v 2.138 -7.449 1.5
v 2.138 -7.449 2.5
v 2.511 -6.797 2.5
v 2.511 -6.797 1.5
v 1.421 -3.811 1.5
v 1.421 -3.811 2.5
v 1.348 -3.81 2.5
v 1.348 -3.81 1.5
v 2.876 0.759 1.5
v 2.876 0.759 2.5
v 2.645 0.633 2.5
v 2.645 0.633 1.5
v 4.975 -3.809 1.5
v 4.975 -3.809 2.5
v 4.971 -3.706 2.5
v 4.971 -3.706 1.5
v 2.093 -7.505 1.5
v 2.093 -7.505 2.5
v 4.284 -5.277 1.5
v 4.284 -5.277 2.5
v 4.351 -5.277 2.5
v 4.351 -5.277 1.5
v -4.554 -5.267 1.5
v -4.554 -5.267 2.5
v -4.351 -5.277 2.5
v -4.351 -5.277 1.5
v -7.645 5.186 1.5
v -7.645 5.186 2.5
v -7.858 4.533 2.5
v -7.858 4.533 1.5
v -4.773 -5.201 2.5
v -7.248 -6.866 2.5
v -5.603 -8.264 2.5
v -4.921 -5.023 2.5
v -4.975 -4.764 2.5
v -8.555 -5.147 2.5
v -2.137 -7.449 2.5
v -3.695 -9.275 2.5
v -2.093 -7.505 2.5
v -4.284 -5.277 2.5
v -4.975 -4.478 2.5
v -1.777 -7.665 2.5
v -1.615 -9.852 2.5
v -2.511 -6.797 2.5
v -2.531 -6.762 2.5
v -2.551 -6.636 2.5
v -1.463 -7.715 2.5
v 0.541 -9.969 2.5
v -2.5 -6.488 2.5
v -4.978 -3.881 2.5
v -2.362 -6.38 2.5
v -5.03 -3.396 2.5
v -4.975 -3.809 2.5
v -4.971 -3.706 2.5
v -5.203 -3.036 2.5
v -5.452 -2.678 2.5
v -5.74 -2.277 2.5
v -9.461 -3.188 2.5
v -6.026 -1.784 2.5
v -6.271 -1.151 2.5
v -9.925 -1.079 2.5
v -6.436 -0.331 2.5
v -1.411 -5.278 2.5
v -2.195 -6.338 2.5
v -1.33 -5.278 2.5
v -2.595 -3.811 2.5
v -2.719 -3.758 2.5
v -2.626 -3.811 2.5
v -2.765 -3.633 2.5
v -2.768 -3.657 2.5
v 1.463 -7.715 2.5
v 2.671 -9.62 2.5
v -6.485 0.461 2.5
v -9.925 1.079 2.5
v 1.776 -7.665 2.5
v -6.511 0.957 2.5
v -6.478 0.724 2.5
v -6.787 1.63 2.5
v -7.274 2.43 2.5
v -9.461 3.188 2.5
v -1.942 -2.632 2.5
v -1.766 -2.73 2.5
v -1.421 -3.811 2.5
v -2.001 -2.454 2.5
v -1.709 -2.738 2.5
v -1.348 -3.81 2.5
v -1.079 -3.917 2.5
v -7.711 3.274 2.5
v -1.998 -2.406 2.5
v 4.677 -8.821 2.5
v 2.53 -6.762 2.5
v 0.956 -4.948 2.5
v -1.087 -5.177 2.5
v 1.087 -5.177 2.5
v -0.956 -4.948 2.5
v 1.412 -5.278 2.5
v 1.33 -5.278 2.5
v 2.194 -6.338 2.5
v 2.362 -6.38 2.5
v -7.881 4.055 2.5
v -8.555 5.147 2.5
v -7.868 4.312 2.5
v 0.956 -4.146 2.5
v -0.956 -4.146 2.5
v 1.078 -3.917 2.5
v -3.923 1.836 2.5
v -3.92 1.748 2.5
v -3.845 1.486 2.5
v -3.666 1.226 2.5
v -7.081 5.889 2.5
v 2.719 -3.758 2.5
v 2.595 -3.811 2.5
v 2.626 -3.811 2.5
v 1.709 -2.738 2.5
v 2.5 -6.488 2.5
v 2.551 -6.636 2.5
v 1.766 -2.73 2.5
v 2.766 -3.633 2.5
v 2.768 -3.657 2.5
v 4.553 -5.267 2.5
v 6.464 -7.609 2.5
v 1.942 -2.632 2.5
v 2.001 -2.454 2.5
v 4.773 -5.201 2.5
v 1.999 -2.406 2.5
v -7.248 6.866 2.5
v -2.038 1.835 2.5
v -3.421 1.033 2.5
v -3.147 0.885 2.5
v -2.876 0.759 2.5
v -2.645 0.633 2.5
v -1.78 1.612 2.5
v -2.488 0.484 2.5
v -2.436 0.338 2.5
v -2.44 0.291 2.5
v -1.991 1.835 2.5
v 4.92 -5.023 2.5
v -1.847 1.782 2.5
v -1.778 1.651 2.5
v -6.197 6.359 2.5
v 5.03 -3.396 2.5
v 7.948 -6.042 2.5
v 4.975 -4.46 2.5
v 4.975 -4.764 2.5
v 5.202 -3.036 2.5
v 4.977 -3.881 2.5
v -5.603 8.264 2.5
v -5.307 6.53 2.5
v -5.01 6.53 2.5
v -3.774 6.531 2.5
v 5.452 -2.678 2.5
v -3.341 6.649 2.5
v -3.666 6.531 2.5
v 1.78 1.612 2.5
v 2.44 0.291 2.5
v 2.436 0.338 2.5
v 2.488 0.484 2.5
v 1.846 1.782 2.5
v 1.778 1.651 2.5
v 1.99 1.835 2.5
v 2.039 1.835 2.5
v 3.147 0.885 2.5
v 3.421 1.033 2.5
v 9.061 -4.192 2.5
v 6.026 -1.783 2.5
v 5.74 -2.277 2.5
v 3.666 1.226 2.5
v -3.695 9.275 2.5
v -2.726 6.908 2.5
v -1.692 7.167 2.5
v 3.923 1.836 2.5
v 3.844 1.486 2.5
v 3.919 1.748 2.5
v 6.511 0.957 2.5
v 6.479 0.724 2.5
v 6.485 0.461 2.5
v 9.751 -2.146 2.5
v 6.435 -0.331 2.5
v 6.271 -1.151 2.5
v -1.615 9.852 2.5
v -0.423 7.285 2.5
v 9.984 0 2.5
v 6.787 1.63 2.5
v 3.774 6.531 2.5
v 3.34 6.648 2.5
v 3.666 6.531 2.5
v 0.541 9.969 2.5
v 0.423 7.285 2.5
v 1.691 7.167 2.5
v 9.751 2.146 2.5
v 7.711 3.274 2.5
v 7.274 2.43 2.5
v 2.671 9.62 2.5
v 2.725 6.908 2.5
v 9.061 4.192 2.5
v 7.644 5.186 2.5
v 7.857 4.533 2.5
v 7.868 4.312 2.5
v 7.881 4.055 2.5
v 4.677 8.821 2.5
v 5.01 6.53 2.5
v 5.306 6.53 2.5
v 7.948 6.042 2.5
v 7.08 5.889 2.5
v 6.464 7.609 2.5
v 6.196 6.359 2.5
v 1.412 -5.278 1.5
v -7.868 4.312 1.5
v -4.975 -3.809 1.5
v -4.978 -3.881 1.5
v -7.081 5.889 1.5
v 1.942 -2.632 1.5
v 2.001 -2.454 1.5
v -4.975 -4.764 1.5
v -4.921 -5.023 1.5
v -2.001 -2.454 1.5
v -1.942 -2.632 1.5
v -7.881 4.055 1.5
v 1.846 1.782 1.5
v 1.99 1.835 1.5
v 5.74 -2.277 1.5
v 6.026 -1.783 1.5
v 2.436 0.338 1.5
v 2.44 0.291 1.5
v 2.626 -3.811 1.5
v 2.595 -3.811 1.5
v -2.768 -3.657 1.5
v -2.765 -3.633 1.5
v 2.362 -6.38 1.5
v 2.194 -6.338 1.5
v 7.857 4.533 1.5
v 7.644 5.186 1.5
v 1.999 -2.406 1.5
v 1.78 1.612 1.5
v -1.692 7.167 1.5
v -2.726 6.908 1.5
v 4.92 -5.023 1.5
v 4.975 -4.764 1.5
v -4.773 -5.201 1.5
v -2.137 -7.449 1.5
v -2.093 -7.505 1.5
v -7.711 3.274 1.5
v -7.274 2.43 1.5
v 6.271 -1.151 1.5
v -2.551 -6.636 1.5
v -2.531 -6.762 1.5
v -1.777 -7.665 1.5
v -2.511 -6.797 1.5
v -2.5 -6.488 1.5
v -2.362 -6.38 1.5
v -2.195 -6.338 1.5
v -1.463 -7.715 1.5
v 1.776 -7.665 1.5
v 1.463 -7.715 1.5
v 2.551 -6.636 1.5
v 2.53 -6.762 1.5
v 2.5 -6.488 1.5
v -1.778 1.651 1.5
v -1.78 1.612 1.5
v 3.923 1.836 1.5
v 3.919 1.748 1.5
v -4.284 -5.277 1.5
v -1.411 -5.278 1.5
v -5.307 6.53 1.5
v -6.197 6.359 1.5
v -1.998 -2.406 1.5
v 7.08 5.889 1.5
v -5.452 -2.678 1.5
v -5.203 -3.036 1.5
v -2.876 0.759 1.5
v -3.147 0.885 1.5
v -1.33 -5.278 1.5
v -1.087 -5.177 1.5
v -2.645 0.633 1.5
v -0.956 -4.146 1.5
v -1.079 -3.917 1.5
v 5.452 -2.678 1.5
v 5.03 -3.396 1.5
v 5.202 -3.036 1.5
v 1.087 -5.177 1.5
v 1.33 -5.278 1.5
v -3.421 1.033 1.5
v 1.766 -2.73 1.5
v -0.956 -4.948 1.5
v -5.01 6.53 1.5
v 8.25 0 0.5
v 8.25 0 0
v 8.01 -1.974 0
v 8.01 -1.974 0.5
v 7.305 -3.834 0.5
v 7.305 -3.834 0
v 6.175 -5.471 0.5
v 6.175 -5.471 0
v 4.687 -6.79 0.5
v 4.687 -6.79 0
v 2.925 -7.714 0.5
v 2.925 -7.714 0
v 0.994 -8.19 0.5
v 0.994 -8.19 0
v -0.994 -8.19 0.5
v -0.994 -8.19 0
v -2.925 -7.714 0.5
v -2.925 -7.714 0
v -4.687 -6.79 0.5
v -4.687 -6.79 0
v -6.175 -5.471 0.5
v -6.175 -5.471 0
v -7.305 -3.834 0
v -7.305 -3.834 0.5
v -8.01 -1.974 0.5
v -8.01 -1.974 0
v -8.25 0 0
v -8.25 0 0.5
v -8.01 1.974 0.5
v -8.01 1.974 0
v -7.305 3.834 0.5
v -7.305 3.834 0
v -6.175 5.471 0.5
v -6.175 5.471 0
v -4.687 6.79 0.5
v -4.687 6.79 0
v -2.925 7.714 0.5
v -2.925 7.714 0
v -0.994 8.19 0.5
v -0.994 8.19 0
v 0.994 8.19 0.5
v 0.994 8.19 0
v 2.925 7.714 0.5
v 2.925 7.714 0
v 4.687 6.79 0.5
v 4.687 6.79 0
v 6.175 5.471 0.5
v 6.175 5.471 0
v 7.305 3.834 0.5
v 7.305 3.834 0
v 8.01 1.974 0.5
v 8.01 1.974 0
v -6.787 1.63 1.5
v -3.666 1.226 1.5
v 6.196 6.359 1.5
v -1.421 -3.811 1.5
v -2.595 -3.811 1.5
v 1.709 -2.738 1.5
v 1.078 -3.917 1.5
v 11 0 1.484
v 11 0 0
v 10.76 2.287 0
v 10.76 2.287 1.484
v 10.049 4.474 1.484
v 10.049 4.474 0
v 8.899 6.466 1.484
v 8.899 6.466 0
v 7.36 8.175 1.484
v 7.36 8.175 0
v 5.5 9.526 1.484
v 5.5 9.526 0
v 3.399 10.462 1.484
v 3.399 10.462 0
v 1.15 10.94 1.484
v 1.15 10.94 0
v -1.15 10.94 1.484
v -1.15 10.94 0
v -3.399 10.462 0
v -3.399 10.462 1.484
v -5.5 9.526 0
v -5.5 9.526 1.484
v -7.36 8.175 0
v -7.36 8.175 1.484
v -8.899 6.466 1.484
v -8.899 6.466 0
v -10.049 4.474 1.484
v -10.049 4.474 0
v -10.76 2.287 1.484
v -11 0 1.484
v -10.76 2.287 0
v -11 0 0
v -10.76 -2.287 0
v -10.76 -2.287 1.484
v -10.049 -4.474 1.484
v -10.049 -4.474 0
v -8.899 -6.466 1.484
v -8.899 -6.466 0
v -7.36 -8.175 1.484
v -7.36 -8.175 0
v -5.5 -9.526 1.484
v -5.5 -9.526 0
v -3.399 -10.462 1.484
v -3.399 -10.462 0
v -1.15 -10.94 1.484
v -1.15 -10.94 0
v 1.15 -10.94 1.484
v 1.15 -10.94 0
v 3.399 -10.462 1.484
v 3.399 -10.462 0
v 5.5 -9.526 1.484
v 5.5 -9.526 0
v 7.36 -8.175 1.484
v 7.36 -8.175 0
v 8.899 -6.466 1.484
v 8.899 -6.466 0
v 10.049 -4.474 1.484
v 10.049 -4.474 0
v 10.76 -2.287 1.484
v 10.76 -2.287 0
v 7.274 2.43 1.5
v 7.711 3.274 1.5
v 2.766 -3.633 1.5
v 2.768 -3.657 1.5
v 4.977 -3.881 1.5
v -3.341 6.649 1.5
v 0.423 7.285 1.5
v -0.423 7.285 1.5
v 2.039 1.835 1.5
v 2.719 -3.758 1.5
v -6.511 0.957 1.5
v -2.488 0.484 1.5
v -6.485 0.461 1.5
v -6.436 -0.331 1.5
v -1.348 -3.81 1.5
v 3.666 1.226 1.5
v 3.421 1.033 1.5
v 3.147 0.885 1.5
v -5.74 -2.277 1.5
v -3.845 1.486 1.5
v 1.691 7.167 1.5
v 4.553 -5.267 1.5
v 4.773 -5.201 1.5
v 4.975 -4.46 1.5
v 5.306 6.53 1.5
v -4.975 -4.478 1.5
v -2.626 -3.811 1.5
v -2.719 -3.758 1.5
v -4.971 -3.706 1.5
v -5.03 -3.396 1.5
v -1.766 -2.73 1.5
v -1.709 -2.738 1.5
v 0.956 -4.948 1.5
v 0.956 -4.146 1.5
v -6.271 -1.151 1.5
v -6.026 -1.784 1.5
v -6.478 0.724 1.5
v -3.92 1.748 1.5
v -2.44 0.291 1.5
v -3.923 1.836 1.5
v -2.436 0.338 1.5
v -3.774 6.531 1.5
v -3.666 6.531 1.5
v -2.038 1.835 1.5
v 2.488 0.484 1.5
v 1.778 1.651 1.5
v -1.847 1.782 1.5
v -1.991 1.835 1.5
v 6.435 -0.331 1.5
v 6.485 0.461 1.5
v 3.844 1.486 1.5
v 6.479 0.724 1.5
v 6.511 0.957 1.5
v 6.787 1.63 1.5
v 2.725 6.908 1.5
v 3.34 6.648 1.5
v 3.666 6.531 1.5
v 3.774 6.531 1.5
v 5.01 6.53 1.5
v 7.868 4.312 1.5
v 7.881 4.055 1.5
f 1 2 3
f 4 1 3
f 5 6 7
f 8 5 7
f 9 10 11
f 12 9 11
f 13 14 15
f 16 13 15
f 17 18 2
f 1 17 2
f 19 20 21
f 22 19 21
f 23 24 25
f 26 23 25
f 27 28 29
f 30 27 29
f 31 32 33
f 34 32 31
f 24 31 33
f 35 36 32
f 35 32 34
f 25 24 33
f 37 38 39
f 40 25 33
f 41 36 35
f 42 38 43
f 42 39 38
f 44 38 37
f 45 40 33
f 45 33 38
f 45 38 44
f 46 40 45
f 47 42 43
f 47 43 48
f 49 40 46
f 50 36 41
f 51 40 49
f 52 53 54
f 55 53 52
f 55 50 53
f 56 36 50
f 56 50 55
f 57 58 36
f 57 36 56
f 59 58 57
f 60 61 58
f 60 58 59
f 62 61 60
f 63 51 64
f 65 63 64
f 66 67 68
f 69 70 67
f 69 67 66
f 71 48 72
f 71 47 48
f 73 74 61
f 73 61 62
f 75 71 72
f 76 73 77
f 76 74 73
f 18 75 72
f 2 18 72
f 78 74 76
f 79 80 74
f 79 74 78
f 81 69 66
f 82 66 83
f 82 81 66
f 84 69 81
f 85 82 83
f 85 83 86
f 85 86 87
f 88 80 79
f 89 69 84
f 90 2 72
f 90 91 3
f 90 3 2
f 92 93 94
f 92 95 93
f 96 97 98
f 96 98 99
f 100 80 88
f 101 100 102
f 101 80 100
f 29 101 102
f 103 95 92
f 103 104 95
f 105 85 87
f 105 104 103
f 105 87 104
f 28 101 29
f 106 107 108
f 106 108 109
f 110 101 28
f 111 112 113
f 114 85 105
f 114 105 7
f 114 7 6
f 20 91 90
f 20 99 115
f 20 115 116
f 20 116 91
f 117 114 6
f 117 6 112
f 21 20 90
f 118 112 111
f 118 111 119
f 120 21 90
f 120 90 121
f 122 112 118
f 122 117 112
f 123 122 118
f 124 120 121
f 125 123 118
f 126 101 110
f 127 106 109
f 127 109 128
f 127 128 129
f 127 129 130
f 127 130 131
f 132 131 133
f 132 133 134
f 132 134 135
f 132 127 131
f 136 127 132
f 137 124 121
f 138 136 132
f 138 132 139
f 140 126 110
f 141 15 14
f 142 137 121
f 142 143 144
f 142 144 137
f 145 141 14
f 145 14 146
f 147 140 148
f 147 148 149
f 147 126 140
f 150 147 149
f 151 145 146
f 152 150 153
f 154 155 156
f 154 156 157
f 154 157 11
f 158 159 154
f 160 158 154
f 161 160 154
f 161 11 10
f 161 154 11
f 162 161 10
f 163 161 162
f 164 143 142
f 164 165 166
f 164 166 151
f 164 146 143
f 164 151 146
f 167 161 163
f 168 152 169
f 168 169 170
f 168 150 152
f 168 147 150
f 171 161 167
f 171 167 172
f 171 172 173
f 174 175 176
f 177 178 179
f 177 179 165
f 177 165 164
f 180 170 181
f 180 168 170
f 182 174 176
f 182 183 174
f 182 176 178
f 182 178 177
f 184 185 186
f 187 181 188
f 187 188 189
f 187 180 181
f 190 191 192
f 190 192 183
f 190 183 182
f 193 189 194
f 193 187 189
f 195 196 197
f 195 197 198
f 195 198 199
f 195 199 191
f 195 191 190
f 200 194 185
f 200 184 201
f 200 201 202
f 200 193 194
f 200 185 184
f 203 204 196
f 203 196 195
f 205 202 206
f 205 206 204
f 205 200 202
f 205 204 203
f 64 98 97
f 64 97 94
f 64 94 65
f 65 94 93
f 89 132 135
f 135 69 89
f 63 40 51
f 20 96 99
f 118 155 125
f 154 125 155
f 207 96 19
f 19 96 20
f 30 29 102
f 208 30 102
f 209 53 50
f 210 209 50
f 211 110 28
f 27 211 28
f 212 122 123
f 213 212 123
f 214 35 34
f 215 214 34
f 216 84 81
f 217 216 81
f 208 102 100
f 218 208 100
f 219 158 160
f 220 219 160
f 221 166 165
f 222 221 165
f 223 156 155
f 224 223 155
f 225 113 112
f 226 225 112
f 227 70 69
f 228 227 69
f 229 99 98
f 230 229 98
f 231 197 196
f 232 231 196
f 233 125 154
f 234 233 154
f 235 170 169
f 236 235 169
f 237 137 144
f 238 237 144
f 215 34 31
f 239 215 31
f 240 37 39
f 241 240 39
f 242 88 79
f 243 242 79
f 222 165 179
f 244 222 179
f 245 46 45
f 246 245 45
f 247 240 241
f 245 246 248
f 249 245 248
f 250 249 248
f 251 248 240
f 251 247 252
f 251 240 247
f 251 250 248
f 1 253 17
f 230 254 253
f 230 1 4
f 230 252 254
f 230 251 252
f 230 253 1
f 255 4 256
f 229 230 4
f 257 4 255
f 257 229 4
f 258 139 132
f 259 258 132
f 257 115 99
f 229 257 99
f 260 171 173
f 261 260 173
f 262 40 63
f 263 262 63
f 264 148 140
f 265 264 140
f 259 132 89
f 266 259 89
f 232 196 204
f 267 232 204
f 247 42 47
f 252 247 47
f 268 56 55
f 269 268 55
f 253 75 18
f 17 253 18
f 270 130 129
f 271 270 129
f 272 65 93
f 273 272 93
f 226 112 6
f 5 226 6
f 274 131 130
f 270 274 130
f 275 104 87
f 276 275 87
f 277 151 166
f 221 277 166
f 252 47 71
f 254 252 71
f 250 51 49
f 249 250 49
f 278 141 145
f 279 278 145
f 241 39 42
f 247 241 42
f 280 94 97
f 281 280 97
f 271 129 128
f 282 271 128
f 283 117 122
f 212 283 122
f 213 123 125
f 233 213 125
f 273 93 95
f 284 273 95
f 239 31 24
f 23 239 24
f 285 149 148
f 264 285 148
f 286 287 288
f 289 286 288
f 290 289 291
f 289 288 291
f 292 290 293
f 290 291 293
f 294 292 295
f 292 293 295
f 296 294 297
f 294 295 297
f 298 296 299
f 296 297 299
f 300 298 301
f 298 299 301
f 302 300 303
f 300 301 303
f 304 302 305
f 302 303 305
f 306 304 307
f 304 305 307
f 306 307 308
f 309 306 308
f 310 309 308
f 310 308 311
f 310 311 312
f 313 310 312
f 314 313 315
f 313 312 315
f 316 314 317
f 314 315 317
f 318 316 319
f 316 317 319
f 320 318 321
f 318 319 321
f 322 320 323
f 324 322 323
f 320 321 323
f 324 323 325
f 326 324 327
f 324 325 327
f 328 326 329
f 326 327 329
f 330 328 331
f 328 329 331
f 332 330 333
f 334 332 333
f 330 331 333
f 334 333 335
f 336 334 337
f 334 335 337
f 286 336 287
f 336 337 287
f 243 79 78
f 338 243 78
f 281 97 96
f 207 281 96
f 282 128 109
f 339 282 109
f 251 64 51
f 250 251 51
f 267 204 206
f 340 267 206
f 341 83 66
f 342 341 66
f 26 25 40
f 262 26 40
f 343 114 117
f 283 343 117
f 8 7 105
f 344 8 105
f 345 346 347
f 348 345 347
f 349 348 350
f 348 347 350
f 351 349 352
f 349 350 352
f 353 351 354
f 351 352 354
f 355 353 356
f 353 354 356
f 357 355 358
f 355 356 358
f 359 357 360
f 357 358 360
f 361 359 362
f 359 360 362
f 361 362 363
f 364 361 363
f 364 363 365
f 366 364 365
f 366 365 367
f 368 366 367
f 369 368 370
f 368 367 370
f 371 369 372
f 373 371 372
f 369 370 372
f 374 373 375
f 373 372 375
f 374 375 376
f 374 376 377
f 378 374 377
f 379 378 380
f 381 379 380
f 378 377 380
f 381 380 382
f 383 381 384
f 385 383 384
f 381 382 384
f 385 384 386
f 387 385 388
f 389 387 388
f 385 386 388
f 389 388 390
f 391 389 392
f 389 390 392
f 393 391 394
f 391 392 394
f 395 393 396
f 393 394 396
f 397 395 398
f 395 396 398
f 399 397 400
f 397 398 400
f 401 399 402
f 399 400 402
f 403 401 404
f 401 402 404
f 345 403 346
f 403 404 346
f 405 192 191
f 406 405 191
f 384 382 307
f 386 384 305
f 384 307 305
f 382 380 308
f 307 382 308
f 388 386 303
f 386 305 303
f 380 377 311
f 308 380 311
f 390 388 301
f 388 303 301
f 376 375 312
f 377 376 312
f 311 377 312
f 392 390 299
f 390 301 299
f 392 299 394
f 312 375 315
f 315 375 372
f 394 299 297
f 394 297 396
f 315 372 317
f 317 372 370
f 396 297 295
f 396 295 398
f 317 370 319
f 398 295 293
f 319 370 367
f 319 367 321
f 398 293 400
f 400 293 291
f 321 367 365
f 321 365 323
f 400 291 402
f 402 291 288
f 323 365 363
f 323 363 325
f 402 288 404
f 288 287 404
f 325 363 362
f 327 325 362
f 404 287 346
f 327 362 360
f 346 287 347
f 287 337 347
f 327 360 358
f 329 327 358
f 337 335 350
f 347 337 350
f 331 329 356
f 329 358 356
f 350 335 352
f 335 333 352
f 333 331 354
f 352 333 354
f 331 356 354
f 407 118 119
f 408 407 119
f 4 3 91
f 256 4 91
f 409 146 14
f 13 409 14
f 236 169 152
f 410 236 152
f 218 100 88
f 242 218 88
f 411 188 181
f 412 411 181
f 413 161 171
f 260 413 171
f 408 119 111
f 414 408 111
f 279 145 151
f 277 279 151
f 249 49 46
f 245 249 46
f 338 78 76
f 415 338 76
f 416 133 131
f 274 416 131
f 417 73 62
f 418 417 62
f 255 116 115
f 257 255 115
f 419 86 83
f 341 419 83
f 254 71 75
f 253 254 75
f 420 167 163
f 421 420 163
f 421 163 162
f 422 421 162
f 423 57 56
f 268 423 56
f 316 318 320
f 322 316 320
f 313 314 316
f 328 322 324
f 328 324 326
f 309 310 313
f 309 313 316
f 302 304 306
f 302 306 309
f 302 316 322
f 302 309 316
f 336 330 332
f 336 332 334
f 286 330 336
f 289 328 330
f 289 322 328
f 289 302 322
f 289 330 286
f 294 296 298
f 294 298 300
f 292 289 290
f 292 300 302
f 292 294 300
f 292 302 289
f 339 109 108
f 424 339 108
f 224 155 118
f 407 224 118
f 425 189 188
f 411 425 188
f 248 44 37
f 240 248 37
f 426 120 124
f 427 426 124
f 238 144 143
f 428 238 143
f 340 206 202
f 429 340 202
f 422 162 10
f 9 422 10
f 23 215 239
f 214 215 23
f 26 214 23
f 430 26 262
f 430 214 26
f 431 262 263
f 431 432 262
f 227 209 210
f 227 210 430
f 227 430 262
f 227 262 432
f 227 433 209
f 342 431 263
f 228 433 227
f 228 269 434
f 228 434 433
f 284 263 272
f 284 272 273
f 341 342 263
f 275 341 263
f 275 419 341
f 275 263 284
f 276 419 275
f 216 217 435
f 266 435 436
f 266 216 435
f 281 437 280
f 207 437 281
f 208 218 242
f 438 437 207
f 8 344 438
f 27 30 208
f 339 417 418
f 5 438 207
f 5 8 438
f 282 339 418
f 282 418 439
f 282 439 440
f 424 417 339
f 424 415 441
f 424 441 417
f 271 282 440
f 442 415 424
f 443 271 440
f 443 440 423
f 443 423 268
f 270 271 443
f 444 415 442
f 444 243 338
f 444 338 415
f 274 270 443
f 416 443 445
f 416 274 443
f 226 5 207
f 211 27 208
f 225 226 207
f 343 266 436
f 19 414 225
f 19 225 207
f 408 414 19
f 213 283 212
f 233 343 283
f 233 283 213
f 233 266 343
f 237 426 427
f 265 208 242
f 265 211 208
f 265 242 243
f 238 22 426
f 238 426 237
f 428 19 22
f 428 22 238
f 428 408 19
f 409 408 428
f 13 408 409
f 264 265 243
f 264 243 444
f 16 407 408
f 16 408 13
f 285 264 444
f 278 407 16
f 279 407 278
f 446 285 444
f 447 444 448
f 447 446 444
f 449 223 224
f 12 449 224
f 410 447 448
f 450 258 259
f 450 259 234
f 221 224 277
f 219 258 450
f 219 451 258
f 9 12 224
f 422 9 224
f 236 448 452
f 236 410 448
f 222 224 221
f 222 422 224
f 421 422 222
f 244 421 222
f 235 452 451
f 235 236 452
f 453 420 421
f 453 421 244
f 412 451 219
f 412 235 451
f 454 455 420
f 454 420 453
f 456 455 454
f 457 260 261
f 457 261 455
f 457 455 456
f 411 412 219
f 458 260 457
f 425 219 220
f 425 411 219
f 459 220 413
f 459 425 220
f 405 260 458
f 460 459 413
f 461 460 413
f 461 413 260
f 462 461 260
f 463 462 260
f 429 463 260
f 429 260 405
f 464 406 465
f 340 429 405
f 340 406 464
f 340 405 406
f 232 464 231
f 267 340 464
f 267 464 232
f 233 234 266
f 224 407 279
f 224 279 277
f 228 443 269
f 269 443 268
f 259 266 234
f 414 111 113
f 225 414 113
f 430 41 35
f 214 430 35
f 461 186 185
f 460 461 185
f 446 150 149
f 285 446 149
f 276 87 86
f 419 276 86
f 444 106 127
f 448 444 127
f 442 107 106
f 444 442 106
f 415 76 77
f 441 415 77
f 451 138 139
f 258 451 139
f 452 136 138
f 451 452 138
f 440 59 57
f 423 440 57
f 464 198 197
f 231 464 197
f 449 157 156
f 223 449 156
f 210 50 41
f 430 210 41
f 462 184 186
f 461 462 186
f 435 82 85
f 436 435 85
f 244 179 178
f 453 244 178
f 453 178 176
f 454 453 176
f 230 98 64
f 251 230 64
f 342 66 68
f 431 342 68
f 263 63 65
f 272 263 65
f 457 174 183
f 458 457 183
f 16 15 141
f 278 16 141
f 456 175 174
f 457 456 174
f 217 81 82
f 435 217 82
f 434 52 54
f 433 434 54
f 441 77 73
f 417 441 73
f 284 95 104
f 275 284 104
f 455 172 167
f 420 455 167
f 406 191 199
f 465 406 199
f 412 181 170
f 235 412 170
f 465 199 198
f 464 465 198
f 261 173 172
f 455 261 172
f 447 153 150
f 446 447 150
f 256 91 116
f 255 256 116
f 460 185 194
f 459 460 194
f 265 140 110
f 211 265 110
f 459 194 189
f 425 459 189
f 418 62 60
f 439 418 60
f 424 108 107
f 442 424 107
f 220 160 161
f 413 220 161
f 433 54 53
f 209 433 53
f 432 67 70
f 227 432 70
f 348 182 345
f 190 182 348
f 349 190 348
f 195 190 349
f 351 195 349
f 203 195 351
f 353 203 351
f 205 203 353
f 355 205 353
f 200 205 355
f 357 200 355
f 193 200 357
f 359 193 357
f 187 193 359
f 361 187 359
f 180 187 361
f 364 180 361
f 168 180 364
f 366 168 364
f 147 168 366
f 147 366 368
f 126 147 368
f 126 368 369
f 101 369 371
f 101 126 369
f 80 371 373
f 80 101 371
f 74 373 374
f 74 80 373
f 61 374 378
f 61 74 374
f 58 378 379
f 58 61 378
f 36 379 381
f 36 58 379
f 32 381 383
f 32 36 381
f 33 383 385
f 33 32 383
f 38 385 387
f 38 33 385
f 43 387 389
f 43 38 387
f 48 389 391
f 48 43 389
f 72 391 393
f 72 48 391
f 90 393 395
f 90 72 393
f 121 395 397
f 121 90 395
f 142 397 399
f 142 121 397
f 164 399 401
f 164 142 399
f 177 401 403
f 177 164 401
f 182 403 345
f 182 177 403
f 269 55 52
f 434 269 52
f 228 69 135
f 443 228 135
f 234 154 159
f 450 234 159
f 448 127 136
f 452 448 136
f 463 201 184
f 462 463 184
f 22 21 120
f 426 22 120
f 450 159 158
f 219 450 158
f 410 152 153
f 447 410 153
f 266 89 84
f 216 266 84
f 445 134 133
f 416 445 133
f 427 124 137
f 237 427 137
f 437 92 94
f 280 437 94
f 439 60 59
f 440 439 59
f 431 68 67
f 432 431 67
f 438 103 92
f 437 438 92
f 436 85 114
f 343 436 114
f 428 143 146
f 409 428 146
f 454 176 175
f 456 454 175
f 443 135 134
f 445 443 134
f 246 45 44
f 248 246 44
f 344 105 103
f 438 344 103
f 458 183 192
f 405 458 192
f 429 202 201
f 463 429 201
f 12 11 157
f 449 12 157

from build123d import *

# Parameters (mm, degrees)
F0_R     = 11
F1_DEPTH = 2.5
F3_DEPTH = 1
F4_SIZE  = 1.016
F5_R     = 8.25
F6_DEPTH = 0.5


with BuildPart() as f1:
    # F0 (on Top) → F1 (new body)
    with BuildSketch(Plane.XY):
        Circle(F0_R)
    extrude(amount=F1_DEPTH)

    # F2 (on face) → F3 (cut)
    with BuildSketch(Plane.XY.offset(2.5)):
        Polygon((-1.708768, -2.738023), (1.709315, -2.738023), (1.765715, -2.730263), (1.942346, -2.632438), (2.000932, -2.453948), (1.998746, -2.405964), (1.780361, 1.612295), (1.778175, 1.651316), (1.84627, 1.782478), (1.99033, 1.835161), (2.038532, 1.835161), (3.923003, 1.835708), (3.919396, 1.748048), (3.844087, 1.485942), (3.665597, 1.225695), (3.421308, 1.032886), (3.146633, 0.884673), (2.876329, 0.758867), (2.645156, 0.63317), (2.48798, 0.48441), (2.43639, 0.337837), (2.440434, 0.290509), (2.766044, -3.632876), (2.767793, -3.656595), (2.719154, -3.757917), (2.626138, -3.811366), (2.595315, -3.811366), (1.421086, -3.81071), (1.347636, -3.810164), (1.078316, -3.917498), (0.956226, -4.145829), (0.956226, -4.222286), (0.956226, -4.871625), (0.956226, -4.947535), (1.086623, -5.177025), (1.330475, -5.277834), (1.411686, -5.277834), (4.284136, -5.276632), (4.351138, -5.276632), (4.553346, -5.267145), (4.772714, -5.201323), (4.920381, -5.023435), (4.974923, -4.76369), (4.974923, -4.677713), (4.974923, -4.460083), (4.977327, -3.881319), (4.974923, -3.808961), (4.970769, -3.706436), (5.029573, -3.396238), (5.202052, -3.035652), (5.452352, -2.678126), (5.739816, -2.27666), (6.026296, -1.783272), (6.271132, -1.150525), (6.434975, -0.33098), (6.485363, 0.461238), (6.478914, 0.72389), (6.511377, 0.956922), (6.786599, 1.630111), (7.273975, 2.429981), (7.711073, 3.274446), (7.8806, 4.055298), (7.868248, 4.312157), (7.85699, 4.532728), (7.643961, 5.185696), (7.080183, 5.888834), (6.195932, 6.359159), (5.306435, 6.529998), (5.010008, 6.529998), (3.774134, 6.530544), (3.665597, 6.530544), (3.340097, 6.648481), (2.725056, 6.907635), (1.690952, 7.167446), (0.422506, 7.284945), (0.000273, 7.284945), (-0.423052, 7.284945), (-1.691608, 7.167446), (-2.725712, 6.908291), (-3.340643, 6.649137), (-3.665707, 6.530544), (-3.773587, 6.530544), (-5.010008, 6.529998), (-5.30709, 6.529998), (-6.196588, 6.359159), (-7.081342, 5.888834), (-7.645273, 5.185696), (-7.857559, 4.532728), (-7.868238, 4.312157), (-7.881288, 4.055298), (-7.711105, 3.274446), (-7.274062, 2.429981), (-6.78661, 1.630111), (-6.51083, 0.956922), (-6.478258, 0.72389), (-6.485363, 0.460692), (-6.435521, -0.33098), (-6.271241, -1.151181), (-6.026405, -1.783819), (-5.739925, -2.277207), (-5.452352, -2.678126), (-5.202707, -3.035652), (-5.03012, -3.396238), (-4.971425, -3.706436), (-4.975032, -3.808961), (-4.977983, -3.881319), (-4.975032, -4.478467), (-4.975032, -4.677713), (-4.975032, -4.76369), (-4.921037, -5.023435), (-4.77337, -5.201323), (-4.554002, -5.267145), (-4.351138, -5.276632), (-4.283589, -5.276632), (-1.411031, -5.277834), (-1.330475, -5.277834), (-1.086623, -5.177025), (-0.956226, -4.947535), (-0.956226, -4.871625), (-0.956226, -4.222286), (-0.956226, -4.145829), (-1.079081, -3.917498), (-1.347636, -3.810164), (-1.420649, -3.81071), (-2.594659, -3.811366), (-2.626138, -3.811366), (-2.719263, -3.757917), (-2.767902, -3.656595), (-2.765498, -3.632876), (-2.439888, 0.290509), (-2.43639, 0.337837), (-2.48798, 0.48441), (-2.644501, 0.63317), (-2.875783, 0.758867), (-3.146742, 0.884673), (-3.421308, 1.032886), (-3.666253, 1.225695), (-3.844743, 1.485942), (-3.919505, 1.748048), (-3.923003, 1.835708), (-2.038422, 1.835161), (-1.990986, 1.835161), (-1.846926, 1.782478), (-1.778175, 1.651316), (-1.779924, 1.612295), (-1.99809, -2.405964), (-2.001151, -2.453948), (-1.942346, -2.632438), (-1.765715, -2.730263), align=None)
        Polygon((-1.357801, -7.715055), (1.358238, -7.715055), (1.462621, -7.715055), (1.776317, -7.664656), (2.092964, -7.50454), (2.138106, -7.449386), (2.511043, -6.796505), (2.530062, -6.761518), (2.551266, -6.635799), (2.500441, -6.488143), (2.361518, -6.379628), (2.194396, -6.337515), (2.139308, -6.337515), (-2.138652, -6.337515), (-2.194943, -6.337515), (-2.362283, -6.379628), (-2.500441, -6.488143), (-2.551375, -6.635799), (-2.530608, -6.761518), (-2.511043, -6.796505), (-2.13745, -7.449386), (-2.092964, -7.50454), (-1.776863, -7.664656), (-1.462621, -7.715055), align=None)
    extrude(amount=-F3_DEPTH, mode=Mode.SUBTRACT)

    # F4
    f4_edges = [f1.edges().sort_by_distance(p)[0] for p in [
        (-11, 0, 2.5),
    ]]
    chamfer(f4_edges, length=F4_SIZE)

    # F5 (on face) → F6 (cut)
    with BuildSketch(Plane(origin=(0, 0, 0), x_dir=(1, 0, 0), z_dir=(0, 0, -1))):
        Circle(F5_R)
    extrude(amount=-F6_DEPTH, mode=Mode.SUBTRACT)


solid = f1.part
